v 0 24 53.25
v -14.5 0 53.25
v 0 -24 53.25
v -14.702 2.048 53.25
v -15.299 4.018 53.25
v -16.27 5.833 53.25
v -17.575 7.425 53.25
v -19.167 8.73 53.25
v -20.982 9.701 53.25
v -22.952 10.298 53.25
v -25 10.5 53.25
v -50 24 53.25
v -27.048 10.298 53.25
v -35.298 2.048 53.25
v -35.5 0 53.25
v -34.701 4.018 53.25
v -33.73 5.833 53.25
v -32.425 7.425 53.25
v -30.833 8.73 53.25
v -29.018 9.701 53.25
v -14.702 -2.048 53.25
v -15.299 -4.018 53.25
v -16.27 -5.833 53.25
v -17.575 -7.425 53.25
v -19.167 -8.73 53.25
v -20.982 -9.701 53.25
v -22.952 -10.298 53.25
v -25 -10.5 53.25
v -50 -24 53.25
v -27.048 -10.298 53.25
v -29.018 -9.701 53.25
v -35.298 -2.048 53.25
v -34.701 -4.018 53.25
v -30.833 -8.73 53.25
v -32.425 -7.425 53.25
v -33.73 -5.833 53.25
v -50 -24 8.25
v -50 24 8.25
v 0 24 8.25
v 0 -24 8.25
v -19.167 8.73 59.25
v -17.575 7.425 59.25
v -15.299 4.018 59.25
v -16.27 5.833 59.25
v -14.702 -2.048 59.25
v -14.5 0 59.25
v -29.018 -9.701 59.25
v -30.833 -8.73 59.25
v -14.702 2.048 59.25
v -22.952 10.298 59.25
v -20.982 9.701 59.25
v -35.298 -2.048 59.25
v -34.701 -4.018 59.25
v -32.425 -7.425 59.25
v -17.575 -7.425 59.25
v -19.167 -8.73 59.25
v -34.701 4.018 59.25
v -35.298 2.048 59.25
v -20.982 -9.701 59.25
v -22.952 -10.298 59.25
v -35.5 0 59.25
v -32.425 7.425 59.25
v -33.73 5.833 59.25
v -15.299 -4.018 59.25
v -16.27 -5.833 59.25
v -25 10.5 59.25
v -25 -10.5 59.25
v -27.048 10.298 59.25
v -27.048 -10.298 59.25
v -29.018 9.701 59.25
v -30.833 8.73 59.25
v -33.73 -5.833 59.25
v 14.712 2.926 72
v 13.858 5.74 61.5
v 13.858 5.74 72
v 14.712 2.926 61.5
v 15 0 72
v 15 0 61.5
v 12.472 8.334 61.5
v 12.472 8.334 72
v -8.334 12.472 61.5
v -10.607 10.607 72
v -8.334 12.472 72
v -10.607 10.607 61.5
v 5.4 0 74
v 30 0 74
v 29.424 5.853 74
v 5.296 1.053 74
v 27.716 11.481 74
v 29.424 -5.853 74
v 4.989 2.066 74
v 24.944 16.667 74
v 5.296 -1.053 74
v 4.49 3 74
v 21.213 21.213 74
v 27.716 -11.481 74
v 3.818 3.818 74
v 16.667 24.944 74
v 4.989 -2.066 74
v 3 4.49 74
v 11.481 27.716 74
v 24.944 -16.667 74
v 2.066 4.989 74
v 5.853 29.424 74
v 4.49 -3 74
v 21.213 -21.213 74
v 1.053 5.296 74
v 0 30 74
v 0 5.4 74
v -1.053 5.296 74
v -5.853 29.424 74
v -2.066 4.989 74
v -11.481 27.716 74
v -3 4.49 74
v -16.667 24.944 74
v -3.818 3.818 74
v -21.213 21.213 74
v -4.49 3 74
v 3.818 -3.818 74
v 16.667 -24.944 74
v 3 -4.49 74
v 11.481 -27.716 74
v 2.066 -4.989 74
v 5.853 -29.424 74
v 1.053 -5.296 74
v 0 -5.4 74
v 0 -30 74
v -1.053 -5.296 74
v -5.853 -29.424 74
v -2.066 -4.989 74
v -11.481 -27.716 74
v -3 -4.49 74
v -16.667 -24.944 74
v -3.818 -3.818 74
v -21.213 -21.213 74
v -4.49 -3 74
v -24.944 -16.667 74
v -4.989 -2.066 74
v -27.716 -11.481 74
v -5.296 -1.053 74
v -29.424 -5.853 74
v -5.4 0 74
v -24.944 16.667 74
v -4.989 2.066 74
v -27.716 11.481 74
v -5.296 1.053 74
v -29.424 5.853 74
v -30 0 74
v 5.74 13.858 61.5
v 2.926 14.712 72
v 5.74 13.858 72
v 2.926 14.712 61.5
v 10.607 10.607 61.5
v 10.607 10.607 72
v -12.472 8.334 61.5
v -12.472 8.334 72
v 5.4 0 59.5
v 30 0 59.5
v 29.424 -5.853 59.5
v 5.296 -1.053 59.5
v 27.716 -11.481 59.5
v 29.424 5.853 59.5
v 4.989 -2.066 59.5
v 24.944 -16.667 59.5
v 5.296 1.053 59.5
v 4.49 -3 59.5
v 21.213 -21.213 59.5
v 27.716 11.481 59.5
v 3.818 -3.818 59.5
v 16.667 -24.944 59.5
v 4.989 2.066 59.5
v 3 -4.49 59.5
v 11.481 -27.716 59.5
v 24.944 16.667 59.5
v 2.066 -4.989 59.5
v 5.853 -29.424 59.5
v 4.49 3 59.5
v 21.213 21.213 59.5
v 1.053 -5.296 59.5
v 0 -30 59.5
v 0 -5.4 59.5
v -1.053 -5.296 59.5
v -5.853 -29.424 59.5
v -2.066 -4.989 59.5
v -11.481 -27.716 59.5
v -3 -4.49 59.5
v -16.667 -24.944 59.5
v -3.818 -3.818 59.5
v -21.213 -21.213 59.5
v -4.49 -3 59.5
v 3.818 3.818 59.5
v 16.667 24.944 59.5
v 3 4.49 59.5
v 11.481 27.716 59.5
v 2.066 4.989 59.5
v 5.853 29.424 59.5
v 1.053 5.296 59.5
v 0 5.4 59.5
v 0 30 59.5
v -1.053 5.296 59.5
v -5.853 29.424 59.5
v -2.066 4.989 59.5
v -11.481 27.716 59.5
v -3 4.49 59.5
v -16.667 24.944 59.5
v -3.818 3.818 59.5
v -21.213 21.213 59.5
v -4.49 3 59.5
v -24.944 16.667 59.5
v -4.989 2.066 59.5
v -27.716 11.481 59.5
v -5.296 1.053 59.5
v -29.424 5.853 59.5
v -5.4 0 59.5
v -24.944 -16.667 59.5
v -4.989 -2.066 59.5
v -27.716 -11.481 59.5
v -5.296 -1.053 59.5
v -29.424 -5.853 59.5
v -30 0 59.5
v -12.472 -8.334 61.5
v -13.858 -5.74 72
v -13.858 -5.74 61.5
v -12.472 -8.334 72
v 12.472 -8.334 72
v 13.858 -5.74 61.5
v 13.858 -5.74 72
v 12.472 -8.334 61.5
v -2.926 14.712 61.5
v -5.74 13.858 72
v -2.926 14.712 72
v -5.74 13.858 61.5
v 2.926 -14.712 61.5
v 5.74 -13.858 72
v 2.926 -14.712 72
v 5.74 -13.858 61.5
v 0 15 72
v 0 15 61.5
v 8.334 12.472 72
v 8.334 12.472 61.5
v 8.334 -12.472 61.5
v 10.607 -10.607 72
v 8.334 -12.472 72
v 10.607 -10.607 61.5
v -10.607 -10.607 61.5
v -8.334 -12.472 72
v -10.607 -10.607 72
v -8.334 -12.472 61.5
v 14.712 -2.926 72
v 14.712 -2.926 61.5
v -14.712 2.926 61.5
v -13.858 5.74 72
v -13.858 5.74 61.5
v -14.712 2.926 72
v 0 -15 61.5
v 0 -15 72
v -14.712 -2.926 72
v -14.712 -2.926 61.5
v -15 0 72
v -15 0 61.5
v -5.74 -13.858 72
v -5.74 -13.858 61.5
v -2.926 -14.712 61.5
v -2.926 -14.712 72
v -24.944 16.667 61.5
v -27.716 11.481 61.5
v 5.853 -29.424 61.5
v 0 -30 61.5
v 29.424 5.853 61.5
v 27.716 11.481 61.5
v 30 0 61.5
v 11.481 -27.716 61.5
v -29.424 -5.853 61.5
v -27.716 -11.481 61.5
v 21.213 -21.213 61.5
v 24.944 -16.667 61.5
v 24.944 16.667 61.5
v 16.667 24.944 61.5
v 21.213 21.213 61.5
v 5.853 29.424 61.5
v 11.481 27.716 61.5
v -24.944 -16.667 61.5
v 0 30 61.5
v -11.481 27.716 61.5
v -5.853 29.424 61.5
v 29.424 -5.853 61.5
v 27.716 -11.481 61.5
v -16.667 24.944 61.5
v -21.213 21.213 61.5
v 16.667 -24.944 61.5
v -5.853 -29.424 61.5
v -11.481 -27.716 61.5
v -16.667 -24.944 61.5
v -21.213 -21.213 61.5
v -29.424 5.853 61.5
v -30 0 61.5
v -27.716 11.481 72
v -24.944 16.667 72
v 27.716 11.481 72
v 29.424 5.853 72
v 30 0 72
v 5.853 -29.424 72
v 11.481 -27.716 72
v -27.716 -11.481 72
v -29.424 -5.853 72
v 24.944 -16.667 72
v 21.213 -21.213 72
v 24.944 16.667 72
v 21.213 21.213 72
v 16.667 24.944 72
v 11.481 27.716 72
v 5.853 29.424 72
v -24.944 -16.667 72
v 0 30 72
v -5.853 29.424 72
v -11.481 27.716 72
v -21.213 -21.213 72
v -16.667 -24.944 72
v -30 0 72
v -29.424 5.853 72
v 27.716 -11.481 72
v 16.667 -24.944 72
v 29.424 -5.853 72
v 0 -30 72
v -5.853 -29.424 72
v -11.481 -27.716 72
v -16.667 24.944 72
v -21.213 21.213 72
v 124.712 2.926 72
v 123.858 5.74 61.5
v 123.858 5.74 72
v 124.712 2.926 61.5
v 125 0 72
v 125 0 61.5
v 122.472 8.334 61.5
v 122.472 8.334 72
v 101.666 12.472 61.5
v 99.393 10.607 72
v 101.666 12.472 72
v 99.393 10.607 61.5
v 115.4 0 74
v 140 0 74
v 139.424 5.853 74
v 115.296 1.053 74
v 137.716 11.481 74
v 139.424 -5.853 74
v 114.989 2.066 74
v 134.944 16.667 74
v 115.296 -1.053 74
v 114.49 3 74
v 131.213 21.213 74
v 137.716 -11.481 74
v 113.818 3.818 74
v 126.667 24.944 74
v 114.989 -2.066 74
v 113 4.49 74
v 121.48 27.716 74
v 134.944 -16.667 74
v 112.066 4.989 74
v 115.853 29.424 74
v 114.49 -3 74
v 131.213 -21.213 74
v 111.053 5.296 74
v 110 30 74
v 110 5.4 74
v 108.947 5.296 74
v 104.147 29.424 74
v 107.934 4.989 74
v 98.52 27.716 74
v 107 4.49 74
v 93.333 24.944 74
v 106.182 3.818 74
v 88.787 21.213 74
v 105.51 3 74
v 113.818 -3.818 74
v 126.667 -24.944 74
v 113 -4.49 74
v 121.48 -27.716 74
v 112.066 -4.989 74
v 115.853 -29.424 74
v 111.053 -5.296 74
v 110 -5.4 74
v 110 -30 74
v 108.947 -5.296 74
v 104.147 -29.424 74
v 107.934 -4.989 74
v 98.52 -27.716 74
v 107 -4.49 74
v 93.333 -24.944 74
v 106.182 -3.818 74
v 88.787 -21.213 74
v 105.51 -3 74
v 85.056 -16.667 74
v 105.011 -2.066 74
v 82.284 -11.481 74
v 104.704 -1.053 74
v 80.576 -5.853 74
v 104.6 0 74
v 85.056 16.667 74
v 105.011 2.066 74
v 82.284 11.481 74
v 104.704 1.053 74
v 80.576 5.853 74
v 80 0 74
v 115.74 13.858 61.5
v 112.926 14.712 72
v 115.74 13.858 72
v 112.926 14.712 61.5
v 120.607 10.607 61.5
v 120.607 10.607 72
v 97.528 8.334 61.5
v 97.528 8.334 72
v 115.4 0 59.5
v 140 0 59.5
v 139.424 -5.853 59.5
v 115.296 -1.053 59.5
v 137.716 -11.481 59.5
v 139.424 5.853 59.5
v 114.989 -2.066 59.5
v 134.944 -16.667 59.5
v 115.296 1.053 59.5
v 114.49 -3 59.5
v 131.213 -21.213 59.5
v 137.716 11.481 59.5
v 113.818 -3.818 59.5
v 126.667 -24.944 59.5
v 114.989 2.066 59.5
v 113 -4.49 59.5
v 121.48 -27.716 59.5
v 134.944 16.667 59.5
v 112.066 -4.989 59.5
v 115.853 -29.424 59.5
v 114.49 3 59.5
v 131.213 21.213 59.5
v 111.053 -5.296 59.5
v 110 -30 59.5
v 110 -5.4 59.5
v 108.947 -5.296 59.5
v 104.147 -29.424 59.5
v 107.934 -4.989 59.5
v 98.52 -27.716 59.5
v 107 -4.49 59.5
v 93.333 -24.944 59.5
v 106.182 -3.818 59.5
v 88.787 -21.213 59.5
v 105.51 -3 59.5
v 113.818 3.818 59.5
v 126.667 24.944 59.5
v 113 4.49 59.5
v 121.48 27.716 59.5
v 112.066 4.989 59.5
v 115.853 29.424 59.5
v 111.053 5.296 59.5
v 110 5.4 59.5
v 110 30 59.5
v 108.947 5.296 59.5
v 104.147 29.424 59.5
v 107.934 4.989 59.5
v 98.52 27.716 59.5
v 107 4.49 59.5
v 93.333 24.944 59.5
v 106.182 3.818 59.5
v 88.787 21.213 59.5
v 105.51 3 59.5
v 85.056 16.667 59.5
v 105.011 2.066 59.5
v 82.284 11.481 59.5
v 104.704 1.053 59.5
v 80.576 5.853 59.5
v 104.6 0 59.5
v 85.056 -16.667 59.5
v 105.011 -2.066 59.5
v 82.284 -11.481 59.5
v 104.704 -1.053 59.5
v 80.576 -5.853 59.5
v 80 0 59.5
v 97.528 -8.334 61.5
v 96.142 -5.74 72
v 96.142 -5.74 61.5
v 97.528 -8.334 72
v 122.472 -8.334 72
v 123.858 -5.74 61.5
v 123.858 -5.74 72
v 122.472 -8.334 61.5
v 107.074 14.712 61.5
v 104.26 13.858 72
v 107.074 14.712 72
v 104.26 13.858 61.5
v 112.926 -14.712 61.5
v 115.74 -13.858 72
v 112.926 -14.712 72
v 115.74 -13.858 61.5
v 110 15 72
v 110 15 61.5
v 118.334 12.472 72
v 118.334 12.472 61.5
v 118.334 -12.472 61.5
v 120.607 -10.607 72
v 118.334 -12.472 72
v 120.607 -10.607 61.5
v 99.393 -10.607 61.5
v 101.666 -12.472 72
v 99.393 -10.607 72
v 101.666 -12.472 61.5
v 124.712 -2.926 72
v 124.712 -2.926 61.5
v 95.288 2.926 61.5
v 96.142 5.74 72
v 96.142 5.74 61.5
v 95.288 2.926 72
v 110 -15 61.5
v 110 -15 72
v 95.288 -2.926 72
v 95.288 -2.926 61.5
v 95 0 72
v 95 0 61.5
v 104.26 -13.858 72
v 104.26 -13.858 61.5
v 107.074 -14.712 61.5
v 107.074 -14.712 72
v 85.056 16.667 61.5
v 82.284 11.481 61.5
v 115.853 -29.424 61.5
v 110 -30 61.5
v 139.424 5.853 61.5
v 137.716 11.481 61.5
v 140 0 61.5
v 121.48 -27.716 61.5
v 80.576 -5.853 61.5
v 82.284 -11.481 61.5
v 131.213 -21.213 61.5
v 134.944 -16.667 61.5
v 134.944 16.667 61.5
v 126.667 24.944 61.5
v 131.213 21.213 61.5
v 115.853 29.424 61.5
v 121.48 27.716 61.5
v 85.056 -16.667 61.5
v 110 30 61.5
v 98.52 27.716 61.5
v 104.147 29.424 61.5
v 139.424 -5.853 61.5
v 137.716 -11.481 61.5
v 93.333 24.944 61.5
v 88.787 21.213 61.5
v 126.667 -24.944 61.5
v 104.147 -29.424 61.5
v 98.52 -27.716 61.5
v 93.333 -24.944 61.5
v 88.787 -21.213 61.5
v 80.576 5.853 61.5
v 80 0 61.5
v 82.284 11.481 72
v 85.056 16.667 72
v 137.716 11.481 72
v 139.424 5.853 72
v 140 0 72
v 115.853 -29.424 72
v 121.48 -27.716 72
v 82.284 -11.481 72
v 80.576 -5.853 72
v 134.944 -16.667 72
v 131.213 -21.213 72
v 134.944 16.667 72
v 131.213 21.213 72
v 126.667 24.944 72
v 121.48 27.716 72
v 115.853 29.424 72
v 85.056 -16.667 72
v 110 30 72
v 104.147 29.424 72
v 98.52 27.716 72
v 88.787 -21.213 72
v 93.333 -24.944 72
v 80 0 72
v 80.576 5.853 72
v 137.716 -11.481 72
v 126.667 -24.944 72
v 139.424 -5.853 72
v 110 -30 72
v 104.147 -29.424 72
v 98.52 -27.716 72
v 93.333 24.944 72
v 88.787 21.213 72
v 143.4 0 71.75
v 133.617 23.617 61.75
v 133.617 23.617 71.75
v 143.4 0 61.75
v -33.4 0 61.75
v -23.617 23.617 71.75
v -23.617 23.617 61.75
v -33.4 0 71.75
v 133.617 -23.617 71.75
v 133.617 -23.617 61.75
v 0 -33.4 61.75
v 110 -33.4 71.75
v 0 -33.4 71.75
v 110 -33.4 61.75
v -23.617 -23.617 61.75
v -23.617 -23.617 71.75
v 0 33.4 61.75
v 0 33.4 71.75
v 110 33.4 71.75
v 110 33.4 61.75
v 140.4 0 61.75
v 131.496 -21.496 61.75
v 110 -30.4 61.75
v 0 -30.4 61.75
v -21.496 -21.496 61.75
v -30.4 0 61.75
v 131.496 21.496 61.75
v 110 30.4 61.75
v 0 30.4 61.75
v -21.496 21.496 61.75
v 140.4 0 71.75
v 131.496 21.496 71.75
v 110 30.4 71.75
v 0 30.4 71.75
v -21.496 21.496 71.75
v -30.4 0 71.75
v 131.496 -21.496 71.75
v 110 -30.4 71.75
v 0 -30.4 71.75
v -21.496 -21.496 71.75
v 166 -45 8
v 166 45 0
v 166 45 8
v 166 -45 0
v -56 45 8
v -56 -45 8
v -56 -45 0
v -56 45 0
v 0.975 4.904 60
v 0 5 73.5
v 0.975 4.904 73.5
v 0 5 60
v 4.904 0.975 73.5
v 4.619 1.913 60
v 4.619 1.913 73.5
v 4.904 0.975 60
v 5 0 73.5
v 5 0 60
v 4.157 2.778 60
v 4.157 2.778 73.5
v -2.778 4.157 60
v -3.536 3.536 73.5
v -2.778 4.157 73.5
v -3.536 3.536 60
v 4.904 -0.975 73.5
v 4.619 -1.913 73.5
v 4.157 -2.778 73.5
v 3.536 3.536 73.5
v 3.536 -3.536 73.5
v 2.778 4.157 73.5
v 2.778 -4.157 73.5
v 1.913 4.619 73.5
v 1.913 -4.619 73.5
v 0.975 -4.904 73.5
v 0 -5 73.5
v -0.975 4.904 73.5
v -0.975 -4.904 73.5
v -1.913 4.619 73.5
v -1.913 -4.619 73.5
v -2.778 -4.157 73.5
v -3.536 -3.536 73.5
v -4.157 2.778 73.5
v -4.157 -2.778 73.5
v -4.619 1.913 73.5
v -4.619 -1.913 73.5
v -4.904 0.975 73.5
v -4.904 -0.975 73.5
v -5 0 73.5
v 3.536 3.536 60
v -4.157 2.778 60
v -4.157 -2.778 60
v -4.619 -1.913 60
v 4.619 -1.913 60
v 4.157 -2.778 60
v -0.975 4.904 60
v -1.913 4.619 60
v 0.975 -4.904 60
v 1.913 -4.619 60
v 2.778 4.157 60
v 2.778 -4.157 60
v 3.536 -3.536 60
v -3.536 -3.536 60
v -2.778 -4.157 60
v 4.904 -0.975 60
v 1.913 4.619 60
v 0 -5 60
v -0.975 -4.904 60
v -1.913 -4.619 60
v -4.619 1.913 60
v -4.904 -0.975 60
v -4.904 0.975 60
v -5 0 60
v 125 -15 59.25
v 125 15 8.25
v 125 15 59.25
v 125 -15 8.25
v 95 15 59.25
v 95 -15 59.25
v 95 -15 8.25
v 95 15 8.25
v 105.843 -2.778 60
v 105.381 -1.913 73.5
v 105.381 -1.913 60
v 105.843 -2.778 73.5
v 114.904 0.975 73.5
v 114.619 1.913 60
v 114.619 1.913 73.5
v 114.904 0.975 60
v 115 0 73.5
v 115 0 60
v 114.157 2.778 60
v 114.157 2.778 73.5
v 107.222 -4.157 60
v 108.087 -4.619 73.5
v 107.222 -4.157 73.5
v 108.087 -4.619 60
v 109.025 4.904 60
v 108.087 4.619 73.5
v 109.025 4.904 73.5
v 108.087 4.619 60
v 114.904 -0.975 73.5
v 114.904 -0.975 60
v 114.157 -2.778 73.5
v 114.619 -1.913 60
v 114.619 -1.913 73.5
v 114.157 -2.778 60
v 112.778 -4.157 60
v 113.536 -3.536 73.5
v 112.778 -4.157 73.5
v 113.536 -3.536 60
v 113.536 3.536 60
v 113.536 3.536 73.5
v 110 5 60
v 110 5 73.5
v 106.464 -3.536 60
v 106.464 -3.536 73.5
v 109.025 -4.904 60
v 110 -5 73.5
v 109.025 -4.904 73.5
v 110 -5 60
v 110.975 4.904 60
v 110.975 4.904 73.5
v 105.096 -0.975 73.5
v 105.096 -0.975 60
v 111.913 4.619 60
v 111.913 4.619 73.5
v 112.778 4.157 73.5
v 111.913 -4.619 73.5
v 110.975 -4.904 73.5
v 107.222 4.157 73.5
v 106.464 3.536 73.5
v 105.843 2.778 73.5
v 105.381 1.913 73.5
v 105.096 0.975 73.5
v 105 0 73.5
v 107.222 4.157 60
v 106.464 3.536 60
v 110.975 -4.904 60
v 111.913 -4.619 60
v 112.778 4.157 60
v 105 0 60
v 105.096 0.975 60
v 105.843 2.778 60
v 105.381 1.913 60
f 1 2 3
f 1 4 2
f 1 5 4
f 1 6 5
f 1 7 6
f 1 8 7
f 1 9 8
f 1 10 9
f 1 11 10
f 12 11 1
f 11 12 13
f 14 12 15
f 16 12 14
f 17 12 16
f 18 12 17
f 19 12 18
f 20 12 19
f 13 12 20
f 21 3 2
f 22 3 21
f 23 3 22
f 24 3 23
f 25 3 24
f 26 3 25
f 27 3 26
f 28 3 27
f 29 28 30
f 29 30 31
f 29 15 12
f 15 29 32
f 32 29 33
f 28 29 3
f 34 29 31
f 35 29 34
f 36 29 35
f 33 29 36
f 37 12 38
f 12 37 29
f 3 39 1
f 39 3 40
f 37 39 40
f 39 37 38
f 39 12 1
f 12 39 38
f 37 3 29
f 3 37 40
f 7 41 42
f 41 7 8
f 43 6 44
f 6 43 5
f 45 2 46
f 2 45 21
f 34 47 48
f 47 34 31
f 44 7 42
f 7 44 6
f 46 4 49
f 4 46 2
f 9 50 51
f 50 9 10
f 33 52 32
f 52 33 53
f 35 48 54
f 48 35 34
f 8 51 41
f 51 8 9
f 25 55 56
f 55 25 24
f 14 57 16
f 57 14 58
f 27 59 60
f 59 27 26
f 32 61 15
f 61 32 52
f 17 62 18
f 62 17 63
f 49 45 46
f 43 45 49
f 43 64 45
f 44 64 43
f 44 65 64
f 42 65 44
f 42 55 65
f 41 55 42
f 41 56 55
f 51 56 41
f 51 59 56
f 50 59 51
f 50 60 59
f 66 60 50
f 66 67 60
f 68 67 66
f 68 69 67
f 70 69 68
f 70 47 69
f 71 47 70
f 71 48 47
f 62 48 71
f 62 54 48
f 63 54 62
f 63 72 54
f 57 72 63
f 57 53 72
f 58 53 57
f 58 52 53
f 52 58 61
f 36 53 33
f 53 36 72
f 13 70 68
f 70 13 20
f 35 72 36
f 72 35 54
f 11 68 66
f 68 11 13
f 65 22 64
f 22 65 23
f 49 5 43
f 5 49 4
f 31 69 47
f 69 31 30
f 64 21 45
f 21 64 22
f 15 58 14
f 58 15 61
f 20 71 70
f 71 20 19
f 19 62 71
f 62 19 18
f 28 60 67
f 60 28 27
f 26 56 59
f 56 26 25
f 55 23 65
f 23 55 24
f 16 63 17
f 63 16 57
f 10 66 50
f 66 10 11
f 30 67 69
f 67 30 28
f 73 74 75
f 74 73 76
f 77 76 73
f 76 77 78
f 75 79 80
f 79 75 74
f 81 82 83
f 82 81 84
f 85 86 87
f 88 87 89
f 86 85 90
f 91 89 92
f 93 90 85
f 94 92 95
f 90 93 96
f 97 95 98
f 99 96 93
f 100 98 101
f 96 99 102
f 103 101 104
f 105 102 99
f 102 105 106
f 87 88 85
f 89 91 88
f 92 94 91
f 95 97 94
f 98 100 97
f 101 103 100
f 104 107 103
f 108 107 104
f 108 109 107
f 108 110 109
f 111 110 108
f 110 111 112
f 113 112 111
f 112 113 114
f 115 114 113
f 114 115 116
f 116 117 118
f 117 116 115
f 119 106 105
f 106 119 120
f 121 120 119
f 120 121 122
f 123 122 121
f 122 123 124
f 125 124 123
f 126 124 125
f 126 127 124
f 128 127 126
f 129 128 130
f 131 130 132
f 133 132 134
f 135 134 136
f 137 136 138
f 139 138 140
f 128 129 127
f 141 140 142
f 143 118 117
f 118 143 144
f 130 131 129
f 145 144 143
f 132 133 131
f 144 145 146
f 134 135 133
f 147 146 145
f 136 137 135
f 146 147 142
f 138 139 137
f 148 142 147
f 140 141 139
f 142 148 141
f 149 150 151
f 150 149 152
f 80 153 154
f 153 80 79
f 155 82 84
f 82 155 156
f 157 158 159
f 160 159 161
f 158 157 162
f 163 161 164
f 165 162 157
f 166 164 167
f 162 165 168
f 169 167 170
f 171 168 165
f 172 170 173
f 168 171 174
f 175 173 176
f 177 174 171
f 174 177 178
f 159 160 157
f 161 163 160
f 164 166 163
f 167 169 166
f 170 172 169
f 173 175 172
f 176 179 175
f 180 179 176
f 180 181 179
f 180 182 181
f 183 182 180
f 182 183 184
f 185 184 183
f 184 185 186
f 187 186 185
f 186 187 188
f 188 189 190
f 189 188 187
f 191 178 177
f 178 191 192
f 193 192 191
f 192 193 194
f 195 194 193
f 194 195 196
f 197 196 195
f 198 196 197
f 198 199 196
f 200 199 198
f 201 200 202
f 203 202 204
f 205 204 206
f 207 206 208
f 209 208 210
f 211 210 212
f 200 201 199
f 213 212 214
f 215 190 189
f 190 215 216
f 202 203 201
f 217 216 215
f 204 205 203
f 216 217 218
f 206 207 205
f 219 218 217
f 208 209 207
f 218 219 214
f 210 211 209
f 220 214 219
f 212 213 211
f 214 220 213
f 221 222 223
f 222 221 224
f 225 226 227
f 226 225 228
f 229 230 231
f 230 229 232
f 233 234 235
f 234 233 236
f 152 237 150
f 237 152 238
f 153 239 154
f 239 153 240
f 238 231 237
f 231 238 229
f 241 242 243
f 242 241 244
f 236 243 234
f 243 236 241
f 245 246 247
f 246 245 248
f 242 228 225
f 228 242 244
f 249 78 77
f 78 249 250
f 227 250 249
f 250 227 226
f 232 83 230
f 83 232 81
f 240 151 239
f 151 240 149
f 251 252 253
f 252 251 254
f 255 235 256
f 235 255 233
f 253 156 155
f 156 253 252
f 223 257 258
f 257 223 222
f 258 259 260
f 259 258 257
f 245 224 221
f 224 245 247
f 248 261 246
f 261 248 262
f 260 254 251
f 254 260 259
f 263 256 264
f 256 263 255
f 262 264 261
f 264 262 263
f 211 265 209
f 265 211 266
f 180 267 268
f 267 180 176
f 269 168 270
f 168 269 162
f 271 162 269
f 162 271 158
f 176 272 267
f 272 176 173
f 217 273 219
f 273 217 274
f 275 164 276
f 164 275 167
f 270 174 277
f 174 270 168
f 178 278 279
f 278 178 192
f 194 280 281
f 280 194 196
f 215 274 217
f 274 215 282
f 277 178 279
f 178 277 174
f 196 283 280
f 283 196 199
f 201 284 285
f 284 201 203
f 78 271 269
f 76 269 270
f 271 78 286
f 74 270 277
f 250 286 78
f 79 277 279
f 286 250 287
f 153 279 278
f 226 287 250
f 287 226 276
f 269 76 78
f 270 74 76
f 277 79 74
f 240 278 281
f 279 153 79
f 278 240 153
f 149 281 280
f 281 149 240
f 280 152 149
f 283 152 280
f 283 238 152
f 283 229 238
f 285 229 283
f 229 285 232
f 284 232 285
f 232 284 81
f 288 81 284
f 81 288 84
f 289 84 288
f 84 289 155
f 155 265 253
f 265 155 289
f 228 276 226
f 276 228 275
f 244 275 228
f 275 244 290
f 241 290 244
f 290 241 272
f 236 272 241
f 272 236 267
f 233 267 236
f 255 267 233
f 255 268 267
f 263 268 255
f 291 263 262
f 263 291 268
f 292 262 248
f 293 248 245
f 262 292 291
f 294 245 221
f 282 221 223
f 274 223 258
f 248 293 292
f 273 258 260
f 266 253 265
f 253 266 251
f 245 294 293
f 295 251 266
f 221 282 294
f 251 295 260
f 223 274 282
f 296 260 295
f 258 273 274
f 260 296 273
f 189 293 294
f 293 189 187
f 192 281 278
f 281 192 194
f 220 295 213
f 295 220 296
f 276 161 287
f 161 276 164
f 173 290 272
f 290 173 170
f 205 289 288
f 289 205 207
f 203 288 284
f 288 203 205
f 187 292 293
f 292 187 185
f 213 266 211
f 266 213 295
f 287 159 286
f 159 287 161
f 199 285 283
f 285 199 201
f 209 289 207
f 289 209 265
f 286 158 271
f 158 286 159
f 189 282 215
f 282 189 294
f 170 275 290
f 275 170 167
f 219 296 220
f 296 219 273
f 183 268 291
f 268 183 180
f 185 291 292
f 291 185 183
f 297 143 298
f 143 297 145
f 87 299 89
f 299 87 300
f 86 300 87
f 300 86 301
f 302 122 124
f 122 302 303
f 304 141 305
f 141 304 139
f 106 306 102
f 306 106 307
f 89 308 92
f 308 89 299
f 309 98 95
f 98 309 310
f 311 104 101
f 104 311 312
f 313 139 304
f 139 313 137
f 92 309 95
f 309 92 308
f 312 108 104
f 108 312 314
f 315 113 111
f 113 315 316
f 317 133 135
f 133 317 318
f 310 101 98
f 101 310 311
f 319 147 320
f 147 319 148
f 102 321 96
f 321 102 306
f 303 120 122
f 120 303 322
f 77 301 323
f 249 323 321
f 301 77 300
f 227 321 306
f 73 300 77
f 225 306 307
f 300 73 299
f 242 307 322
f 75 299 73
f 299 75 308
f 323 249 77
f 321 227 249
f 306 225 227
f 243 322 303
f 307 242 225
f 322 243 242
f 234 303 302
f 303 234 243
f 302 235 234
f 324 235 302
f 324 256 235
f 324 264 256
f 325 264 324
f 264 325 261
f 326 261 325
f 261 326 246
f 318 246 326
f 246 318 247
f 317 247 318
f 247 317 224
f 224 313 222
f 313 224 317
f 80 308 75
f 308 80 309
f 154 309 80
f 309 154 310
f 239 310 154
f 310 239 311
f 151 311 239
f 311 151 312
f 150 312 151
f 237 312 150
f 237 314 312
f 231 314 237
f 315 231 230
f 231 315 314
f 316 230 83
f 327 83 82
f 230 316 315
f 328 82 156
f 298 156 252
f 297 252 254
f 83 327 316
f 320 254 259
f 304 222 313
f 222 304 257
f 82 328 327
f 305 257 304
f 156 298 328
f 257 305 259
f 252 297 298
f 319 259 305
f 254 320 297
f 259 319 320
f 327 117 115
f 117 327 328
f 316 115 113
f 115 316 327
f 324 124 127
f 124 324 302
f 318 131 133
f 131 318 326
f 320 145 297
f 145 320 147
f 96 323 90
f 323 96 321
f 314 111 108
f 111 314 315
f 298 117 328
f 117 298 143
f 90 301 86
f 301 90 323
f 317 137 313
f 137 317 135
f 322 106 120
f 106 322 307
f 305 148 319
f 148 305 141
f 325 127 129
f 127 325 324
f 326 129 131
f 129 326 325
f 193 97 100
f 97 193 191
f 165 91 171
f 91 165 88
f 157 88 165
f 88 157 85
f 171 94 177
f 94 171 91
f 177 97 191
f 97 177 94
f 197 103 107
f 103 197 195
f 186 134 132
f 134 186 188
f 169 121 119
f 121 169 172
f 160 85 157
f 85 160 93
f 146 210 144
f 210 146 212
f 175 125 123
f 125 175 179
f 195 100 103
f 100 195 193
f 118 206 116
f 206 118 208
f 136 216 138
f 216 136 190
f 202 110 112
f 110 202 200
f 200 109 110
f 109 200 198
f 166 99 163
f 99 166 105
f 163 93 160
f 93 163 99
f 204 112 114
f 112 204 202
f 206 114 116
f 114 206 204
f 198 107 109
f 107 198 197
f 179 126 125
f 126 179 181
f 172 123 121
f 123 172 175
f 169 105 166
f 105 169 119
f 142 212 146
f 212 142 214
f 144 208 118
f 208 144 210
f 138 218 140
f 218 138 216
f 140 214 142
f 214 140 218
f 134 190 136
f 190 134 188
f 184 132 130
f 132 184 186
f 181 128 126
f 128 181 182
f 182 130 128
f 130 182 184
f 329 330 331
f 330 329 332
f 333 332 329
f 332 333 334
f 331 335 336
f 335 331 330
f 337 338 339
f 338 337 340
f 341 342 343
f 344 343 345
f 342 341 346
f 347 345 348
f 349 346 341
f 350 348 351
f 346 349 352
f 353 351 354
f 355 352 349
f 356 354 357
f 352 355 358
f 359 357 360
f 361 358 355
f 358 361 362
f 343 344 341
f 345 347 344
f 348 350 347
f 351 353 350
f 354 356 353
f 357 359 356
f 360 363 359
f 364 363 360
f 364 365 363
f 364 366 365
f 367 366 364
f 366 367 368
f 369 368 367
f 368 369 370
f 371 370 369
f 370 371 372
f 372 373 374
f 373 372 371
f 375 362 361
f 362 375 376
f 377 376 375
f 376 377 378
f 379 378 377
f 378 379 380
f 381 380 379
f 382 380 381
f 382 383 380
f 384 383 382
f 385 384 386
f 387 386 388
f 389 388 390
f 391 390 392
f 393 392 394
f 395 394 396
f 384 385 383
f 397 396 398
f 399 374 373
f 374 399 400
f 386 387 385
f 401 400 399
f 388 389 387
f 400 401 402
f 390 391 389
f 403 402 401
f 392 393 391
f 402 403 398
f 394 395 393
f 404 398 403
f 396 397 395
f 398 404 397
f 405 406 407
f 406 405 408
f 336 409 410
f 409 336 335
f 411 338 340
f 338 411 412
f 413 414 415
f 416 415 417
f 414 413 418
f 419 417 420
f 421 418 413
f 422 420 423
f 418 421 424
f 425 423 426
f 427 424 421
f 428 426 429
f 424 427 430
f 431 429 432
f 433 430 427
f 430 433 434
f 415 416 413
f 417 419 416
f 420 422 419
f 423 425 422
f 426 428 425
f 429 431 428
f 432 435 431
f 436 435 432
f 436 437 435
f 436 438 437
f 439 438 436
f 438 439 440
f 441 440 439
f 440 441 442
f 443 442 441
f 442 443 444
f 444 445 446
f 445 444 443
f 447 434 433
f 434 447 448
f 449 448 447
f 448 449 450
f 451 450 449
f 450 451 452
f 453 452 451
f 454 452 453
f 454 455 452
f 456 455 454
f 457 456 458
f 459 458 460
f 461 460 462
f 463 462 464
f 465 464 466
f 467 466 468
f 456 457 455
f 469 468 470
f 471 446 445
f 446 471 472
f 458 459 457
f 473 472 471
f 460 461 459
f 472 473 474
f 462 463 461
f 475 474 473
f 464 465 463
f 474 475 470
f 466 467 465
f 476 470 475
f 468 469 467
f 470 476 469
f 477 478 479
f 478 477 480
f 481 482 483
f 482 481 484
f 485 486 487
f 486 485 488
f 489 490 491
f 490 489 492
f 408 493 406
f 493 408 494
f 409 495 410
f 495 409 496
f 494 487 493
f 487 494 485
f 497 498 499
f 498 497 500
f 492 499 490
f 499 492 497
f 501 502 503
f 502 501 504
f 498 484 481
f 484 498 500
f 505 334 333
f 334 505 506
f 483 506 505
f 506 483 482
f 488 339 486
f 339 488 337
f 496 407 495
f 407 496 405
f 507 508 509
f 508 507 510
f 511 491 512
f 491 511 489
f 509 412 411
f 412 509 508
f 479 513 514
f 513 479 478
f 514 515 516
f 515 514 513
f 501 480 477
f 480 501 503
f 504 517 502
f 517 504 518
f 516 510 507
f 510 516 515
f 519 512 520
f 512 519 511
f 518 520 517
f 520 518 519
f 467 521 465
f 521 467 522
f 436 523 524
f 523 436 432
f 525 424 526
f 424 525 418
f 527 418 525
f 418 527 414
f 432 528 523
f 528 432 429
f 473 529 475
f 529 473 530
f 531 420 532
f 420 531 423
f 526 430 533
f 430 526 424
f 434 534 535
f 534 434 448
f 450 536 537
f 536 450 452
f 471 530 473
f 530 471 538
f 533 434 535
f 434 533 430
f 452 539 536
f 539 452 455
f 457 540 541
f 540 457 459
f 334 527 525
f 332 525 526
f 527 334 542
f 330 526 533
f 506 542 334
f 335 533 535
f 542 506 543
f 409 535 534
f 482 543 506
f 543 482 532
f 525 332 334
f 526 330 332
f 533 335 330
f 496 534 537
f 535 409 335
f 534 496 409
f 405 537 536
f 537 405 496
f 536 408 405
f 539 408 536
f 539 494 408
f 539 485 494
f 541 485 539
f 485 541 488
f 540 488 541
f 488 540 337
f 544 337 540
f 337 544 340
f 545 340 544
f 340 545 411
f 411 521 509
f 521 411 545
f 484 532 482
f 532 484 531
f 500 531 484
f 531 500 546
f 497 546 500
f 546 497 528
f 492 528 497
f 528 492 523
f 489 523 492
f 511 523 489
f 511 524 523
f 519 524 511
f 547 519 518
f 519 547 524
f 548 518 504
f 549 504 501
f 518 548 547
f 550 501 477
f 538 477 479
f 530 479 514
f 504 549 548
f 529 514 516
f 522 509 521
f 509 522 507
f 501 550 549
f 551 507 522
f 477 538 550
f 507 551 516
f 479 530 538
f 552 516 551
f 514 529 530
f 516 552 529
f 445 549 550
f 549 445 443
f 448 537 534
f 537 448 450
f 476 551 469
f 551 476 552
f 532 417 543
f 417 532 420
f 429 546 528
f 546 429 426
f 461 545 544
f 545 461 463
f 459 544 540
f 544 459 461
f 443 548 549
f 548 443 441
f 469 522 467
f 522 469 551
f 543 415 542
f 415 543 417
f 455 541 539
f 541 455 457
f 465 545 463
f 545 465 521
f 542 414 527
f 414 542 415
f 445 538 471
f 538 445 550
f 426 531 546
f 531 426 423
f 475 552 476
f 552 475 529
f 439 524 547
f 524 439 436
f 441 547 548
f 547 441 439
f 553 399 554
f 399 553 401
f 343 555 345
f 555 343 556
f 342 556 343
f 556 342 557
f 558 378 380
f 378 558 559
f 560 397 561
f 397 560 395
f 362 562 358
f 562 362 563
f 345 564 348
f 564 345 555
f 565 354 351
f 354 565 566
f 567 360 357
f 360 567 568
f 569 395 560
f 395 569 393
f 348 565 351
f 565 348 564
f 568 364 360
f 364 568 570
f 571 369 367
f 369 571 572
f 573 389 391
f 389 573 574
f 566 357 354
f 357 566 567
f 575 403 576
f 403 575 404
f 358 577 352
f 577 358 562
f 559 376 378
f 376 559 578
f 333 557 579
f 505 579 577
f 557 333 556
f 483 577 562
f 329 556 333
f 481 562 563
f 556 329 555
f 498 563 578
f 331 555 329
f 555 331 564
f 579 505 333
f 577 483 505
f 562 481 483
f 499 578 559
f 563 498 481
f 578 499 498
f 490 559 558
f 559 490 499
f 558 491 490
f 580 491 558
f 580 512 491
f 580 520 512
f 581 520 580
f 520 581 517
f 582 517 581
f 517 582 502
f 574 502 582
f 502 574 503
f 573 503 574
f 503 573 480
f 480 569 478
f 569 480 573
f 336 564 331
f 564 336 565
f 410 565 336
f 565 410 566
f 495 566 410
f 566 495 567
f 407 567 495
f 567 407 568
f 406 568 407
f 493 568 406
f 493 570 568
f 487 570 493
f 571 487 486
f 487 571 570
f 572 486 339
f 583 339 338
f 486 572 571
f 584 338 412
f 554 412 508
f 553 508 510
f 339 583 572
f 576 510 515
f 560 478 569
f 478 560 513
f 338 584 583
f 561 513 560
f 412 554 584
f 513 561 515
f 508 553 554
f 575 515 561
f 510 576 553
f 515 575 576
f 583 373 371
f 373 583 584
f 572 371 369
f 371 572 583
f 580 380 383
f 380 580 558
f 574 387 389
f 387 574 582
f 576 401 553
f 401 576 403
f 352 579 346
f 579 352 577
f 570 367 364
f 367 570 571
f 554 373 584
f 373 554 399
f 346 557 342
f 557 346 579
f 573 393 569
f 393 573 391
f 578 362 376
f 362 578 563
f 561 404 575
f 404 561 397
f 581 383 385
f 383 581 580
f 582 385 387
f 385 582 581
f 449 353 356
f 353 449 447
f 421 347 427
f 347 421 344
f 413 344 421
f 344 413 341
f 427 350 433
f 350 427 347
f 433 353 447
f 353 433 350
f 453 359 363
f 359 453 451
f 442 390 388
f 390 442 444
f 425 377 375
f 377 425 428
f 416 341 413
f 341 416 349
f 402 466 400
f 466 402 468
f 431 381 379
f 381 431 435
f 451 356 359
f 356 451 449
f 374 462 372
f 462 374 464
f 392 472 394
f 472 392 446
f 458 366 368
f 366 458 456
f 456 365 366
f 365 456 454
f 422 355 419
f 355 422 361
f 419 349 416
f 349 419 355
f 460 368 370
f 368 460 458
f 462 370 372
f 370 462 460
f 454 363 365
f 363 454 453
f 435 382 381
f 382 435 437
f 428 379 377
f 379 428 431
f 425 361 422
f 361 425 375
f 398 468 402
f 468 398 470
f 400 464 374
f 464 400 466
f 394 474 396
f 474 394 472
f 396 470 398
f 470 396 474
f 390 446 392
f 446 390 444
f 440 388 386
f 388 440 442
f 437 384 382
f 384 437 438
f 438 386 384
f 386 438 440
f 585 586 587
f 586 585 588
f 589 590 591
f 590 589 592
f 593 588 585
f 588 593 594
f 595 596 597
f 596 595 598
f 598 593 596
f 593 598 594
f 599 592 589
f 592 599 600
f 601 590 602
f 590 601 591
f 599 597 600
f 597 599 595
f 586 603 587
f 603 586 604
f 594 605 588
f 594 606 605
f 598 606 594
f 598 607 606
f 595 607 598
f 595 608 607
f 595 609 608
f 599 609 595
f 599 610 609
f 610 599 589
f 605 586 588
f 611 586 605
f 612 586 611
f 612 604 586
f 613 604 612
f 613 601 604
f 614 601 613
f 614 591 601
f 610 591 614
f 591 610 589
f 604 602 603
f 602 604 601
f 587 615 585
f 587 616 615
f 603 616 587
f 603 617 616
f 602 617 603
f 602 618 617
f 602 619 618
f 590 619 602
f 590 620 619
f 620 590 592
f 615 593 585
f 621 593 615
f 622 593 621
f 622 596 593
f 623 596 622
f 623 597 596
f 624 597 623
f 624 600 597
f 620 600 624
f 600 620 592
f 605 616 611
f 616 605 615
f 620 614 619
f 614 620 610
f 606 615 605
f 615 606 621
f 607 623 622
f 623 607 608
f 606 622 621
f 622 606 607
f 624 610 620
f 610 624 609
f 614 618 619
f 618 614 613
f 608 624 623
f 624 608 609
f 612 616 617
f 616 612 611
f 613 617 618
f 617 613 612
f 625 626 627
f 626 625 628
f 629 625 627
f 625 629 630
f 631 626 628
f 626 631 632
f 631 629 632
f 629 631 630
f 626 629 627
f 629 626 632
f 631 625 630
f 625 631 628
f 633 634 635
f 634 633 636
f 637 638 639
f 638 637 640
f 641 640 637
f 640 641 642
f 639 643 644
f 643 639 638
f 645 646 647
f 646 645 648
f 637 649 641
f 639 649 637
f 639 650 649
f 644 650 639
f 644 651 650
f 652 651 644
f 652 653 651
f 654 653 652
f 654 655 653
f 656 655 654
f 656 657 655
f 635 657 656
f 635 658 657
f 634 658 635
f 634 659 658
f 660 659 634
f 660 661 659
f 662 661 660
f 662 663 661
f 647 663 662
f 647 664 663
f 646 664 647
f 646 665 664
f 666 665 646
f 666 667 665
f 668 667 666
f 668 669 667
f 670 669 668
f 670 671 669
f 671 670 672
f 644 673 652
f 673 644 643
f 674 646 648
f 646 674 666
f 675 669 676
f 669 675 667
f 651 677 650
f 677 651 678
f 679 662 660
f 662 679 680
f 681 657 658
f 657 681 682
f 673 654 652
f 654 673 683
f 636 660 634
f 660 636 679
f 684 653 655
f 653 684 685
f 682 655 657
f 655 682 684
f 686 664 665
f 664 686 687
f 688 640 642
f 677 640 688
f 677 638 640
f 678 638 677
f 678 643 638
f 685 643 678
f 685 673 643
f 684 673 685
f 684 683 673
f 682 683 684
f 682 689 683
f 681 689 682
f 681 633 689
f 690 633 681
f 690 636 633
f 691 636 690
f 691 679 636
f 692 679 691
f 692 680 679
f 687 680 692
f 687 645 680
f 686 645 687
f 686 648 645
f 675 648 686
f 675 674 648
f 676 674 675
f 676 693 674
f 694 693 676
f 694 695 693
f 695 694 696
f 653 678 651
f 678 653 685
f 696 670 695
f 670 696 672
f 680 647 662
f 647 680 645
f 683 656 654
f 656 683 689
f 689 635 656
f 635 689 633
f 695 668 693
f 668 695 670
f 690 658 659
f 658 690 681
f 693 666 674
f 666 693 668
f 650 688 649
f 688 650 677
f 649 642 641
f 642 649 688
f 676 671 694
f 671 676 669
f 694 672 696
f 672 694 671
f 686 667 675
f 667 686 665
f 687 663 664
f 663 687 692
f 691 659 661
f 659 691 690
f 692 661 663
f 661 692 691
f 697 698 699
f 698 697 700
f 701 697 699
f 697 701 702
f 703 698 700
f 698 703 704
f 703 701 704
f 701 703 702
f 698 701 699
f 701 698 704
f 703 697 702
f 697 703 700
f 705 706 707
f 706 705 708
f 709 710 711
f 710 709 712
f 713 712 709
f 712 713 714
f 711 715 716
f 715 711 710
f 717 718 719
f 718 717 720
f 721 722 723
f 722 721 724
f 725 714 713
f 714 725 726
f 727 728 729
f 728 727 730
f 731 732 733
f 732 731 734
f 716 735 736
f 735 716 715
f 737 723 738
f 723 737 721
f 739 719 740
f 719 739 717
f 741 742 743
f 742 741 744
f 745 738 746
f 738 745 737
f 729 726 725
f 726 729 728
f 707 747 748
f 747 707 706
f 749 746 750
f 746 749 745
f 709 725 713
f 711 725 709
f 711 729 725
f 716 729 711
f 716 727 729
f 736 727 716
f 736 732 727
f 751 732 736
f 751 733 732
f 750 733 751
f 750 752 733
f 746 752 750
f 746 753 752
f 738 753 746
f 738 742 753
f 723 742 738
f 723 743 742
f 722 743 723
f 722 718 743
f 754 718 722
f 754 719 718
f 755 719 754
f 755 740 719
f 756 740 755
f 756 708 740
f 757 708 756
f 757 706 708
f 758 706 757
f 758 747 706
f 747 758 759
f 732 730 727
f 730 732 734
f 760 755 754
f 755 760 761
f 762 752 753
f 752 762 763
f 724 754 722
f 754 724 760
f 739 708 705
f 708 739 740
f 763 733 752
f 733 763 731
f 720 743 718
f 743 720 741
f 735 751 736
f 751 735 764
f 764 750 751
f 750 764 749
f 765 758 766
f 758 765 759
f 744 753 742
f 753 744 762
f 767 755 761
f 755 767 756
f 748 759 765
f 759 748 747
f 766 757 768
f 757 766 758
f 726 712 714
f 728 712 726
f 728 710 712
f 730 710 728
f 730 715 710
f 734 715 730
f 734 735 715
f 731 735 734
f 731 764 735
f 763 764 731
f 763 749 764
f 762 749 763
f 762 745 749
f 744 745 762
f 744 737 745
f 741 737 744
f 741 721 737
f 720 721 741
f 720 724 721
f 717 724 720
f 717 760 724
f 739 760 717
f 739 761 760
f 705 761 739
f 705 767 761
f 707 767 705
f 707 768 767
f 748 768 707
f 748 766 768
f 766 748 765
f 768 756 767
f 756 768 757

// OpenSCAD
$fn = 32;

// ------------------------------------------------------------------------
// Motor belt drive: span 110 mm, pulleys d60, belt 10 mm wide
// Every part is its own module, assembly() places every instance.
// ------------------------------------------------------------------------

// --- part 1 ---
module base_plate() {
  difference() {
    translate([-111, -45, 0]) cube([222, 90, 8]);
  }
}

// --- part 2 ---
module motor() {
  union() {
    translate([-22.5, -24, 0]) cube([45, 48, 50]);
    translate([25.5, 0, 25]) rotate([0, 90, 0]) cylinder(h = 6, d = 21, center = true);
  }
}

// --- part 3 ---
module drive_shaft() {
  translate([0, 0, -6.75]) cylinder(h = 13.5, d = 10);
}

// --- part 4 ---
module pulley_drive() {
  difference() {
    union() {
      cylinder(h = 14.5, d = 30);
      cylinder(h = 2, d = 60);
      translate([0, 0, 12.5]) cylinder(h = 2, d = 60);
    }
    translate([0, 0, -1]) cylinder(h = 16.5, d = 10.8);
  }
}

// --- part 5 ---
module idler_post() {
  translate([-15, -15, 0]) cube([30, 30, 51]);
}

// --- part 6 ---
module driven_shaft() {
  translate([0, 0, -6.75]) cylinder(h = 13.5, d = 10);
}

// --- part 7 ---
module pulley_driven() {
  difference() {
    union() {
      cylinder(h = 14.5, d = 30);
      cylinder(h = 2, d = 60);
      translate([0, 0, 12.5]) cylinder(h = 2, d = 60);
    }
    translate([0, 0, -1]) cylinder(h = 16.5, d = 10.8);
  }
}

// --- part 8 ---
module drive_belt() {
  difference() {
    linear_extrude(height = 10) polygon(points = concat([for (a = [90 : 45 : 270]) [33.4 * cos(a), 33.4 * sin(a)]], [for (a = [270 : 45 : 450]) [110 + 33.4 * cos(a), 33.4 * sin(a)]]));
    translate([0, 0, -1]) linear_extrude(height = 12) polygon(points = concat([for (a = [90 : 45 : 270]) [30.4 * cos(a), 30.4 * sin(a)]], [for (a = [270 : 45 : 450]) [110 + 30.4 * cos(a), 30.4 * sin(a)]]));
  }
}

// --- assembly ---
module assembly() {
  color([0.80, 0.24, 0.20]) translate([55, 0, 0]) rotate([0, 0, 0]) base_plate();
  color([0.20, 0.45, 0.75]) translate([0, 0, 30.75]) rotate([0, 270, 0]) motor();
  color([0.25, 0.62, 0.32]) translate([0, 0, 66.75]) rotate([0, 0, 0]) drive_shaft();
  color([0.92, 0.70, 0.18]) translate([0, 0, 59.5]) rotate([0, 0, 0]) pulley_drive();
  color([0.58, 0.35, 0.70]) translate([110, 0, 8.25]) rotate([0, 0, 0]) idler_post();
  color([0.16, 0.66, 0.66]) translate([110, 0, 66.75]) rotate([0, 0, 0]) driven_shaft();
  color([0.85, 0.48, 0.18]) translate([110, 0, 59.5]) rotate([0, 0, 0]) pulley_driven();
  color([0.55, 0.60, 0.65]) translate([0, 0, 61.75]) rotate([0, 0, 0]) drive_belt();
}

assembly();
